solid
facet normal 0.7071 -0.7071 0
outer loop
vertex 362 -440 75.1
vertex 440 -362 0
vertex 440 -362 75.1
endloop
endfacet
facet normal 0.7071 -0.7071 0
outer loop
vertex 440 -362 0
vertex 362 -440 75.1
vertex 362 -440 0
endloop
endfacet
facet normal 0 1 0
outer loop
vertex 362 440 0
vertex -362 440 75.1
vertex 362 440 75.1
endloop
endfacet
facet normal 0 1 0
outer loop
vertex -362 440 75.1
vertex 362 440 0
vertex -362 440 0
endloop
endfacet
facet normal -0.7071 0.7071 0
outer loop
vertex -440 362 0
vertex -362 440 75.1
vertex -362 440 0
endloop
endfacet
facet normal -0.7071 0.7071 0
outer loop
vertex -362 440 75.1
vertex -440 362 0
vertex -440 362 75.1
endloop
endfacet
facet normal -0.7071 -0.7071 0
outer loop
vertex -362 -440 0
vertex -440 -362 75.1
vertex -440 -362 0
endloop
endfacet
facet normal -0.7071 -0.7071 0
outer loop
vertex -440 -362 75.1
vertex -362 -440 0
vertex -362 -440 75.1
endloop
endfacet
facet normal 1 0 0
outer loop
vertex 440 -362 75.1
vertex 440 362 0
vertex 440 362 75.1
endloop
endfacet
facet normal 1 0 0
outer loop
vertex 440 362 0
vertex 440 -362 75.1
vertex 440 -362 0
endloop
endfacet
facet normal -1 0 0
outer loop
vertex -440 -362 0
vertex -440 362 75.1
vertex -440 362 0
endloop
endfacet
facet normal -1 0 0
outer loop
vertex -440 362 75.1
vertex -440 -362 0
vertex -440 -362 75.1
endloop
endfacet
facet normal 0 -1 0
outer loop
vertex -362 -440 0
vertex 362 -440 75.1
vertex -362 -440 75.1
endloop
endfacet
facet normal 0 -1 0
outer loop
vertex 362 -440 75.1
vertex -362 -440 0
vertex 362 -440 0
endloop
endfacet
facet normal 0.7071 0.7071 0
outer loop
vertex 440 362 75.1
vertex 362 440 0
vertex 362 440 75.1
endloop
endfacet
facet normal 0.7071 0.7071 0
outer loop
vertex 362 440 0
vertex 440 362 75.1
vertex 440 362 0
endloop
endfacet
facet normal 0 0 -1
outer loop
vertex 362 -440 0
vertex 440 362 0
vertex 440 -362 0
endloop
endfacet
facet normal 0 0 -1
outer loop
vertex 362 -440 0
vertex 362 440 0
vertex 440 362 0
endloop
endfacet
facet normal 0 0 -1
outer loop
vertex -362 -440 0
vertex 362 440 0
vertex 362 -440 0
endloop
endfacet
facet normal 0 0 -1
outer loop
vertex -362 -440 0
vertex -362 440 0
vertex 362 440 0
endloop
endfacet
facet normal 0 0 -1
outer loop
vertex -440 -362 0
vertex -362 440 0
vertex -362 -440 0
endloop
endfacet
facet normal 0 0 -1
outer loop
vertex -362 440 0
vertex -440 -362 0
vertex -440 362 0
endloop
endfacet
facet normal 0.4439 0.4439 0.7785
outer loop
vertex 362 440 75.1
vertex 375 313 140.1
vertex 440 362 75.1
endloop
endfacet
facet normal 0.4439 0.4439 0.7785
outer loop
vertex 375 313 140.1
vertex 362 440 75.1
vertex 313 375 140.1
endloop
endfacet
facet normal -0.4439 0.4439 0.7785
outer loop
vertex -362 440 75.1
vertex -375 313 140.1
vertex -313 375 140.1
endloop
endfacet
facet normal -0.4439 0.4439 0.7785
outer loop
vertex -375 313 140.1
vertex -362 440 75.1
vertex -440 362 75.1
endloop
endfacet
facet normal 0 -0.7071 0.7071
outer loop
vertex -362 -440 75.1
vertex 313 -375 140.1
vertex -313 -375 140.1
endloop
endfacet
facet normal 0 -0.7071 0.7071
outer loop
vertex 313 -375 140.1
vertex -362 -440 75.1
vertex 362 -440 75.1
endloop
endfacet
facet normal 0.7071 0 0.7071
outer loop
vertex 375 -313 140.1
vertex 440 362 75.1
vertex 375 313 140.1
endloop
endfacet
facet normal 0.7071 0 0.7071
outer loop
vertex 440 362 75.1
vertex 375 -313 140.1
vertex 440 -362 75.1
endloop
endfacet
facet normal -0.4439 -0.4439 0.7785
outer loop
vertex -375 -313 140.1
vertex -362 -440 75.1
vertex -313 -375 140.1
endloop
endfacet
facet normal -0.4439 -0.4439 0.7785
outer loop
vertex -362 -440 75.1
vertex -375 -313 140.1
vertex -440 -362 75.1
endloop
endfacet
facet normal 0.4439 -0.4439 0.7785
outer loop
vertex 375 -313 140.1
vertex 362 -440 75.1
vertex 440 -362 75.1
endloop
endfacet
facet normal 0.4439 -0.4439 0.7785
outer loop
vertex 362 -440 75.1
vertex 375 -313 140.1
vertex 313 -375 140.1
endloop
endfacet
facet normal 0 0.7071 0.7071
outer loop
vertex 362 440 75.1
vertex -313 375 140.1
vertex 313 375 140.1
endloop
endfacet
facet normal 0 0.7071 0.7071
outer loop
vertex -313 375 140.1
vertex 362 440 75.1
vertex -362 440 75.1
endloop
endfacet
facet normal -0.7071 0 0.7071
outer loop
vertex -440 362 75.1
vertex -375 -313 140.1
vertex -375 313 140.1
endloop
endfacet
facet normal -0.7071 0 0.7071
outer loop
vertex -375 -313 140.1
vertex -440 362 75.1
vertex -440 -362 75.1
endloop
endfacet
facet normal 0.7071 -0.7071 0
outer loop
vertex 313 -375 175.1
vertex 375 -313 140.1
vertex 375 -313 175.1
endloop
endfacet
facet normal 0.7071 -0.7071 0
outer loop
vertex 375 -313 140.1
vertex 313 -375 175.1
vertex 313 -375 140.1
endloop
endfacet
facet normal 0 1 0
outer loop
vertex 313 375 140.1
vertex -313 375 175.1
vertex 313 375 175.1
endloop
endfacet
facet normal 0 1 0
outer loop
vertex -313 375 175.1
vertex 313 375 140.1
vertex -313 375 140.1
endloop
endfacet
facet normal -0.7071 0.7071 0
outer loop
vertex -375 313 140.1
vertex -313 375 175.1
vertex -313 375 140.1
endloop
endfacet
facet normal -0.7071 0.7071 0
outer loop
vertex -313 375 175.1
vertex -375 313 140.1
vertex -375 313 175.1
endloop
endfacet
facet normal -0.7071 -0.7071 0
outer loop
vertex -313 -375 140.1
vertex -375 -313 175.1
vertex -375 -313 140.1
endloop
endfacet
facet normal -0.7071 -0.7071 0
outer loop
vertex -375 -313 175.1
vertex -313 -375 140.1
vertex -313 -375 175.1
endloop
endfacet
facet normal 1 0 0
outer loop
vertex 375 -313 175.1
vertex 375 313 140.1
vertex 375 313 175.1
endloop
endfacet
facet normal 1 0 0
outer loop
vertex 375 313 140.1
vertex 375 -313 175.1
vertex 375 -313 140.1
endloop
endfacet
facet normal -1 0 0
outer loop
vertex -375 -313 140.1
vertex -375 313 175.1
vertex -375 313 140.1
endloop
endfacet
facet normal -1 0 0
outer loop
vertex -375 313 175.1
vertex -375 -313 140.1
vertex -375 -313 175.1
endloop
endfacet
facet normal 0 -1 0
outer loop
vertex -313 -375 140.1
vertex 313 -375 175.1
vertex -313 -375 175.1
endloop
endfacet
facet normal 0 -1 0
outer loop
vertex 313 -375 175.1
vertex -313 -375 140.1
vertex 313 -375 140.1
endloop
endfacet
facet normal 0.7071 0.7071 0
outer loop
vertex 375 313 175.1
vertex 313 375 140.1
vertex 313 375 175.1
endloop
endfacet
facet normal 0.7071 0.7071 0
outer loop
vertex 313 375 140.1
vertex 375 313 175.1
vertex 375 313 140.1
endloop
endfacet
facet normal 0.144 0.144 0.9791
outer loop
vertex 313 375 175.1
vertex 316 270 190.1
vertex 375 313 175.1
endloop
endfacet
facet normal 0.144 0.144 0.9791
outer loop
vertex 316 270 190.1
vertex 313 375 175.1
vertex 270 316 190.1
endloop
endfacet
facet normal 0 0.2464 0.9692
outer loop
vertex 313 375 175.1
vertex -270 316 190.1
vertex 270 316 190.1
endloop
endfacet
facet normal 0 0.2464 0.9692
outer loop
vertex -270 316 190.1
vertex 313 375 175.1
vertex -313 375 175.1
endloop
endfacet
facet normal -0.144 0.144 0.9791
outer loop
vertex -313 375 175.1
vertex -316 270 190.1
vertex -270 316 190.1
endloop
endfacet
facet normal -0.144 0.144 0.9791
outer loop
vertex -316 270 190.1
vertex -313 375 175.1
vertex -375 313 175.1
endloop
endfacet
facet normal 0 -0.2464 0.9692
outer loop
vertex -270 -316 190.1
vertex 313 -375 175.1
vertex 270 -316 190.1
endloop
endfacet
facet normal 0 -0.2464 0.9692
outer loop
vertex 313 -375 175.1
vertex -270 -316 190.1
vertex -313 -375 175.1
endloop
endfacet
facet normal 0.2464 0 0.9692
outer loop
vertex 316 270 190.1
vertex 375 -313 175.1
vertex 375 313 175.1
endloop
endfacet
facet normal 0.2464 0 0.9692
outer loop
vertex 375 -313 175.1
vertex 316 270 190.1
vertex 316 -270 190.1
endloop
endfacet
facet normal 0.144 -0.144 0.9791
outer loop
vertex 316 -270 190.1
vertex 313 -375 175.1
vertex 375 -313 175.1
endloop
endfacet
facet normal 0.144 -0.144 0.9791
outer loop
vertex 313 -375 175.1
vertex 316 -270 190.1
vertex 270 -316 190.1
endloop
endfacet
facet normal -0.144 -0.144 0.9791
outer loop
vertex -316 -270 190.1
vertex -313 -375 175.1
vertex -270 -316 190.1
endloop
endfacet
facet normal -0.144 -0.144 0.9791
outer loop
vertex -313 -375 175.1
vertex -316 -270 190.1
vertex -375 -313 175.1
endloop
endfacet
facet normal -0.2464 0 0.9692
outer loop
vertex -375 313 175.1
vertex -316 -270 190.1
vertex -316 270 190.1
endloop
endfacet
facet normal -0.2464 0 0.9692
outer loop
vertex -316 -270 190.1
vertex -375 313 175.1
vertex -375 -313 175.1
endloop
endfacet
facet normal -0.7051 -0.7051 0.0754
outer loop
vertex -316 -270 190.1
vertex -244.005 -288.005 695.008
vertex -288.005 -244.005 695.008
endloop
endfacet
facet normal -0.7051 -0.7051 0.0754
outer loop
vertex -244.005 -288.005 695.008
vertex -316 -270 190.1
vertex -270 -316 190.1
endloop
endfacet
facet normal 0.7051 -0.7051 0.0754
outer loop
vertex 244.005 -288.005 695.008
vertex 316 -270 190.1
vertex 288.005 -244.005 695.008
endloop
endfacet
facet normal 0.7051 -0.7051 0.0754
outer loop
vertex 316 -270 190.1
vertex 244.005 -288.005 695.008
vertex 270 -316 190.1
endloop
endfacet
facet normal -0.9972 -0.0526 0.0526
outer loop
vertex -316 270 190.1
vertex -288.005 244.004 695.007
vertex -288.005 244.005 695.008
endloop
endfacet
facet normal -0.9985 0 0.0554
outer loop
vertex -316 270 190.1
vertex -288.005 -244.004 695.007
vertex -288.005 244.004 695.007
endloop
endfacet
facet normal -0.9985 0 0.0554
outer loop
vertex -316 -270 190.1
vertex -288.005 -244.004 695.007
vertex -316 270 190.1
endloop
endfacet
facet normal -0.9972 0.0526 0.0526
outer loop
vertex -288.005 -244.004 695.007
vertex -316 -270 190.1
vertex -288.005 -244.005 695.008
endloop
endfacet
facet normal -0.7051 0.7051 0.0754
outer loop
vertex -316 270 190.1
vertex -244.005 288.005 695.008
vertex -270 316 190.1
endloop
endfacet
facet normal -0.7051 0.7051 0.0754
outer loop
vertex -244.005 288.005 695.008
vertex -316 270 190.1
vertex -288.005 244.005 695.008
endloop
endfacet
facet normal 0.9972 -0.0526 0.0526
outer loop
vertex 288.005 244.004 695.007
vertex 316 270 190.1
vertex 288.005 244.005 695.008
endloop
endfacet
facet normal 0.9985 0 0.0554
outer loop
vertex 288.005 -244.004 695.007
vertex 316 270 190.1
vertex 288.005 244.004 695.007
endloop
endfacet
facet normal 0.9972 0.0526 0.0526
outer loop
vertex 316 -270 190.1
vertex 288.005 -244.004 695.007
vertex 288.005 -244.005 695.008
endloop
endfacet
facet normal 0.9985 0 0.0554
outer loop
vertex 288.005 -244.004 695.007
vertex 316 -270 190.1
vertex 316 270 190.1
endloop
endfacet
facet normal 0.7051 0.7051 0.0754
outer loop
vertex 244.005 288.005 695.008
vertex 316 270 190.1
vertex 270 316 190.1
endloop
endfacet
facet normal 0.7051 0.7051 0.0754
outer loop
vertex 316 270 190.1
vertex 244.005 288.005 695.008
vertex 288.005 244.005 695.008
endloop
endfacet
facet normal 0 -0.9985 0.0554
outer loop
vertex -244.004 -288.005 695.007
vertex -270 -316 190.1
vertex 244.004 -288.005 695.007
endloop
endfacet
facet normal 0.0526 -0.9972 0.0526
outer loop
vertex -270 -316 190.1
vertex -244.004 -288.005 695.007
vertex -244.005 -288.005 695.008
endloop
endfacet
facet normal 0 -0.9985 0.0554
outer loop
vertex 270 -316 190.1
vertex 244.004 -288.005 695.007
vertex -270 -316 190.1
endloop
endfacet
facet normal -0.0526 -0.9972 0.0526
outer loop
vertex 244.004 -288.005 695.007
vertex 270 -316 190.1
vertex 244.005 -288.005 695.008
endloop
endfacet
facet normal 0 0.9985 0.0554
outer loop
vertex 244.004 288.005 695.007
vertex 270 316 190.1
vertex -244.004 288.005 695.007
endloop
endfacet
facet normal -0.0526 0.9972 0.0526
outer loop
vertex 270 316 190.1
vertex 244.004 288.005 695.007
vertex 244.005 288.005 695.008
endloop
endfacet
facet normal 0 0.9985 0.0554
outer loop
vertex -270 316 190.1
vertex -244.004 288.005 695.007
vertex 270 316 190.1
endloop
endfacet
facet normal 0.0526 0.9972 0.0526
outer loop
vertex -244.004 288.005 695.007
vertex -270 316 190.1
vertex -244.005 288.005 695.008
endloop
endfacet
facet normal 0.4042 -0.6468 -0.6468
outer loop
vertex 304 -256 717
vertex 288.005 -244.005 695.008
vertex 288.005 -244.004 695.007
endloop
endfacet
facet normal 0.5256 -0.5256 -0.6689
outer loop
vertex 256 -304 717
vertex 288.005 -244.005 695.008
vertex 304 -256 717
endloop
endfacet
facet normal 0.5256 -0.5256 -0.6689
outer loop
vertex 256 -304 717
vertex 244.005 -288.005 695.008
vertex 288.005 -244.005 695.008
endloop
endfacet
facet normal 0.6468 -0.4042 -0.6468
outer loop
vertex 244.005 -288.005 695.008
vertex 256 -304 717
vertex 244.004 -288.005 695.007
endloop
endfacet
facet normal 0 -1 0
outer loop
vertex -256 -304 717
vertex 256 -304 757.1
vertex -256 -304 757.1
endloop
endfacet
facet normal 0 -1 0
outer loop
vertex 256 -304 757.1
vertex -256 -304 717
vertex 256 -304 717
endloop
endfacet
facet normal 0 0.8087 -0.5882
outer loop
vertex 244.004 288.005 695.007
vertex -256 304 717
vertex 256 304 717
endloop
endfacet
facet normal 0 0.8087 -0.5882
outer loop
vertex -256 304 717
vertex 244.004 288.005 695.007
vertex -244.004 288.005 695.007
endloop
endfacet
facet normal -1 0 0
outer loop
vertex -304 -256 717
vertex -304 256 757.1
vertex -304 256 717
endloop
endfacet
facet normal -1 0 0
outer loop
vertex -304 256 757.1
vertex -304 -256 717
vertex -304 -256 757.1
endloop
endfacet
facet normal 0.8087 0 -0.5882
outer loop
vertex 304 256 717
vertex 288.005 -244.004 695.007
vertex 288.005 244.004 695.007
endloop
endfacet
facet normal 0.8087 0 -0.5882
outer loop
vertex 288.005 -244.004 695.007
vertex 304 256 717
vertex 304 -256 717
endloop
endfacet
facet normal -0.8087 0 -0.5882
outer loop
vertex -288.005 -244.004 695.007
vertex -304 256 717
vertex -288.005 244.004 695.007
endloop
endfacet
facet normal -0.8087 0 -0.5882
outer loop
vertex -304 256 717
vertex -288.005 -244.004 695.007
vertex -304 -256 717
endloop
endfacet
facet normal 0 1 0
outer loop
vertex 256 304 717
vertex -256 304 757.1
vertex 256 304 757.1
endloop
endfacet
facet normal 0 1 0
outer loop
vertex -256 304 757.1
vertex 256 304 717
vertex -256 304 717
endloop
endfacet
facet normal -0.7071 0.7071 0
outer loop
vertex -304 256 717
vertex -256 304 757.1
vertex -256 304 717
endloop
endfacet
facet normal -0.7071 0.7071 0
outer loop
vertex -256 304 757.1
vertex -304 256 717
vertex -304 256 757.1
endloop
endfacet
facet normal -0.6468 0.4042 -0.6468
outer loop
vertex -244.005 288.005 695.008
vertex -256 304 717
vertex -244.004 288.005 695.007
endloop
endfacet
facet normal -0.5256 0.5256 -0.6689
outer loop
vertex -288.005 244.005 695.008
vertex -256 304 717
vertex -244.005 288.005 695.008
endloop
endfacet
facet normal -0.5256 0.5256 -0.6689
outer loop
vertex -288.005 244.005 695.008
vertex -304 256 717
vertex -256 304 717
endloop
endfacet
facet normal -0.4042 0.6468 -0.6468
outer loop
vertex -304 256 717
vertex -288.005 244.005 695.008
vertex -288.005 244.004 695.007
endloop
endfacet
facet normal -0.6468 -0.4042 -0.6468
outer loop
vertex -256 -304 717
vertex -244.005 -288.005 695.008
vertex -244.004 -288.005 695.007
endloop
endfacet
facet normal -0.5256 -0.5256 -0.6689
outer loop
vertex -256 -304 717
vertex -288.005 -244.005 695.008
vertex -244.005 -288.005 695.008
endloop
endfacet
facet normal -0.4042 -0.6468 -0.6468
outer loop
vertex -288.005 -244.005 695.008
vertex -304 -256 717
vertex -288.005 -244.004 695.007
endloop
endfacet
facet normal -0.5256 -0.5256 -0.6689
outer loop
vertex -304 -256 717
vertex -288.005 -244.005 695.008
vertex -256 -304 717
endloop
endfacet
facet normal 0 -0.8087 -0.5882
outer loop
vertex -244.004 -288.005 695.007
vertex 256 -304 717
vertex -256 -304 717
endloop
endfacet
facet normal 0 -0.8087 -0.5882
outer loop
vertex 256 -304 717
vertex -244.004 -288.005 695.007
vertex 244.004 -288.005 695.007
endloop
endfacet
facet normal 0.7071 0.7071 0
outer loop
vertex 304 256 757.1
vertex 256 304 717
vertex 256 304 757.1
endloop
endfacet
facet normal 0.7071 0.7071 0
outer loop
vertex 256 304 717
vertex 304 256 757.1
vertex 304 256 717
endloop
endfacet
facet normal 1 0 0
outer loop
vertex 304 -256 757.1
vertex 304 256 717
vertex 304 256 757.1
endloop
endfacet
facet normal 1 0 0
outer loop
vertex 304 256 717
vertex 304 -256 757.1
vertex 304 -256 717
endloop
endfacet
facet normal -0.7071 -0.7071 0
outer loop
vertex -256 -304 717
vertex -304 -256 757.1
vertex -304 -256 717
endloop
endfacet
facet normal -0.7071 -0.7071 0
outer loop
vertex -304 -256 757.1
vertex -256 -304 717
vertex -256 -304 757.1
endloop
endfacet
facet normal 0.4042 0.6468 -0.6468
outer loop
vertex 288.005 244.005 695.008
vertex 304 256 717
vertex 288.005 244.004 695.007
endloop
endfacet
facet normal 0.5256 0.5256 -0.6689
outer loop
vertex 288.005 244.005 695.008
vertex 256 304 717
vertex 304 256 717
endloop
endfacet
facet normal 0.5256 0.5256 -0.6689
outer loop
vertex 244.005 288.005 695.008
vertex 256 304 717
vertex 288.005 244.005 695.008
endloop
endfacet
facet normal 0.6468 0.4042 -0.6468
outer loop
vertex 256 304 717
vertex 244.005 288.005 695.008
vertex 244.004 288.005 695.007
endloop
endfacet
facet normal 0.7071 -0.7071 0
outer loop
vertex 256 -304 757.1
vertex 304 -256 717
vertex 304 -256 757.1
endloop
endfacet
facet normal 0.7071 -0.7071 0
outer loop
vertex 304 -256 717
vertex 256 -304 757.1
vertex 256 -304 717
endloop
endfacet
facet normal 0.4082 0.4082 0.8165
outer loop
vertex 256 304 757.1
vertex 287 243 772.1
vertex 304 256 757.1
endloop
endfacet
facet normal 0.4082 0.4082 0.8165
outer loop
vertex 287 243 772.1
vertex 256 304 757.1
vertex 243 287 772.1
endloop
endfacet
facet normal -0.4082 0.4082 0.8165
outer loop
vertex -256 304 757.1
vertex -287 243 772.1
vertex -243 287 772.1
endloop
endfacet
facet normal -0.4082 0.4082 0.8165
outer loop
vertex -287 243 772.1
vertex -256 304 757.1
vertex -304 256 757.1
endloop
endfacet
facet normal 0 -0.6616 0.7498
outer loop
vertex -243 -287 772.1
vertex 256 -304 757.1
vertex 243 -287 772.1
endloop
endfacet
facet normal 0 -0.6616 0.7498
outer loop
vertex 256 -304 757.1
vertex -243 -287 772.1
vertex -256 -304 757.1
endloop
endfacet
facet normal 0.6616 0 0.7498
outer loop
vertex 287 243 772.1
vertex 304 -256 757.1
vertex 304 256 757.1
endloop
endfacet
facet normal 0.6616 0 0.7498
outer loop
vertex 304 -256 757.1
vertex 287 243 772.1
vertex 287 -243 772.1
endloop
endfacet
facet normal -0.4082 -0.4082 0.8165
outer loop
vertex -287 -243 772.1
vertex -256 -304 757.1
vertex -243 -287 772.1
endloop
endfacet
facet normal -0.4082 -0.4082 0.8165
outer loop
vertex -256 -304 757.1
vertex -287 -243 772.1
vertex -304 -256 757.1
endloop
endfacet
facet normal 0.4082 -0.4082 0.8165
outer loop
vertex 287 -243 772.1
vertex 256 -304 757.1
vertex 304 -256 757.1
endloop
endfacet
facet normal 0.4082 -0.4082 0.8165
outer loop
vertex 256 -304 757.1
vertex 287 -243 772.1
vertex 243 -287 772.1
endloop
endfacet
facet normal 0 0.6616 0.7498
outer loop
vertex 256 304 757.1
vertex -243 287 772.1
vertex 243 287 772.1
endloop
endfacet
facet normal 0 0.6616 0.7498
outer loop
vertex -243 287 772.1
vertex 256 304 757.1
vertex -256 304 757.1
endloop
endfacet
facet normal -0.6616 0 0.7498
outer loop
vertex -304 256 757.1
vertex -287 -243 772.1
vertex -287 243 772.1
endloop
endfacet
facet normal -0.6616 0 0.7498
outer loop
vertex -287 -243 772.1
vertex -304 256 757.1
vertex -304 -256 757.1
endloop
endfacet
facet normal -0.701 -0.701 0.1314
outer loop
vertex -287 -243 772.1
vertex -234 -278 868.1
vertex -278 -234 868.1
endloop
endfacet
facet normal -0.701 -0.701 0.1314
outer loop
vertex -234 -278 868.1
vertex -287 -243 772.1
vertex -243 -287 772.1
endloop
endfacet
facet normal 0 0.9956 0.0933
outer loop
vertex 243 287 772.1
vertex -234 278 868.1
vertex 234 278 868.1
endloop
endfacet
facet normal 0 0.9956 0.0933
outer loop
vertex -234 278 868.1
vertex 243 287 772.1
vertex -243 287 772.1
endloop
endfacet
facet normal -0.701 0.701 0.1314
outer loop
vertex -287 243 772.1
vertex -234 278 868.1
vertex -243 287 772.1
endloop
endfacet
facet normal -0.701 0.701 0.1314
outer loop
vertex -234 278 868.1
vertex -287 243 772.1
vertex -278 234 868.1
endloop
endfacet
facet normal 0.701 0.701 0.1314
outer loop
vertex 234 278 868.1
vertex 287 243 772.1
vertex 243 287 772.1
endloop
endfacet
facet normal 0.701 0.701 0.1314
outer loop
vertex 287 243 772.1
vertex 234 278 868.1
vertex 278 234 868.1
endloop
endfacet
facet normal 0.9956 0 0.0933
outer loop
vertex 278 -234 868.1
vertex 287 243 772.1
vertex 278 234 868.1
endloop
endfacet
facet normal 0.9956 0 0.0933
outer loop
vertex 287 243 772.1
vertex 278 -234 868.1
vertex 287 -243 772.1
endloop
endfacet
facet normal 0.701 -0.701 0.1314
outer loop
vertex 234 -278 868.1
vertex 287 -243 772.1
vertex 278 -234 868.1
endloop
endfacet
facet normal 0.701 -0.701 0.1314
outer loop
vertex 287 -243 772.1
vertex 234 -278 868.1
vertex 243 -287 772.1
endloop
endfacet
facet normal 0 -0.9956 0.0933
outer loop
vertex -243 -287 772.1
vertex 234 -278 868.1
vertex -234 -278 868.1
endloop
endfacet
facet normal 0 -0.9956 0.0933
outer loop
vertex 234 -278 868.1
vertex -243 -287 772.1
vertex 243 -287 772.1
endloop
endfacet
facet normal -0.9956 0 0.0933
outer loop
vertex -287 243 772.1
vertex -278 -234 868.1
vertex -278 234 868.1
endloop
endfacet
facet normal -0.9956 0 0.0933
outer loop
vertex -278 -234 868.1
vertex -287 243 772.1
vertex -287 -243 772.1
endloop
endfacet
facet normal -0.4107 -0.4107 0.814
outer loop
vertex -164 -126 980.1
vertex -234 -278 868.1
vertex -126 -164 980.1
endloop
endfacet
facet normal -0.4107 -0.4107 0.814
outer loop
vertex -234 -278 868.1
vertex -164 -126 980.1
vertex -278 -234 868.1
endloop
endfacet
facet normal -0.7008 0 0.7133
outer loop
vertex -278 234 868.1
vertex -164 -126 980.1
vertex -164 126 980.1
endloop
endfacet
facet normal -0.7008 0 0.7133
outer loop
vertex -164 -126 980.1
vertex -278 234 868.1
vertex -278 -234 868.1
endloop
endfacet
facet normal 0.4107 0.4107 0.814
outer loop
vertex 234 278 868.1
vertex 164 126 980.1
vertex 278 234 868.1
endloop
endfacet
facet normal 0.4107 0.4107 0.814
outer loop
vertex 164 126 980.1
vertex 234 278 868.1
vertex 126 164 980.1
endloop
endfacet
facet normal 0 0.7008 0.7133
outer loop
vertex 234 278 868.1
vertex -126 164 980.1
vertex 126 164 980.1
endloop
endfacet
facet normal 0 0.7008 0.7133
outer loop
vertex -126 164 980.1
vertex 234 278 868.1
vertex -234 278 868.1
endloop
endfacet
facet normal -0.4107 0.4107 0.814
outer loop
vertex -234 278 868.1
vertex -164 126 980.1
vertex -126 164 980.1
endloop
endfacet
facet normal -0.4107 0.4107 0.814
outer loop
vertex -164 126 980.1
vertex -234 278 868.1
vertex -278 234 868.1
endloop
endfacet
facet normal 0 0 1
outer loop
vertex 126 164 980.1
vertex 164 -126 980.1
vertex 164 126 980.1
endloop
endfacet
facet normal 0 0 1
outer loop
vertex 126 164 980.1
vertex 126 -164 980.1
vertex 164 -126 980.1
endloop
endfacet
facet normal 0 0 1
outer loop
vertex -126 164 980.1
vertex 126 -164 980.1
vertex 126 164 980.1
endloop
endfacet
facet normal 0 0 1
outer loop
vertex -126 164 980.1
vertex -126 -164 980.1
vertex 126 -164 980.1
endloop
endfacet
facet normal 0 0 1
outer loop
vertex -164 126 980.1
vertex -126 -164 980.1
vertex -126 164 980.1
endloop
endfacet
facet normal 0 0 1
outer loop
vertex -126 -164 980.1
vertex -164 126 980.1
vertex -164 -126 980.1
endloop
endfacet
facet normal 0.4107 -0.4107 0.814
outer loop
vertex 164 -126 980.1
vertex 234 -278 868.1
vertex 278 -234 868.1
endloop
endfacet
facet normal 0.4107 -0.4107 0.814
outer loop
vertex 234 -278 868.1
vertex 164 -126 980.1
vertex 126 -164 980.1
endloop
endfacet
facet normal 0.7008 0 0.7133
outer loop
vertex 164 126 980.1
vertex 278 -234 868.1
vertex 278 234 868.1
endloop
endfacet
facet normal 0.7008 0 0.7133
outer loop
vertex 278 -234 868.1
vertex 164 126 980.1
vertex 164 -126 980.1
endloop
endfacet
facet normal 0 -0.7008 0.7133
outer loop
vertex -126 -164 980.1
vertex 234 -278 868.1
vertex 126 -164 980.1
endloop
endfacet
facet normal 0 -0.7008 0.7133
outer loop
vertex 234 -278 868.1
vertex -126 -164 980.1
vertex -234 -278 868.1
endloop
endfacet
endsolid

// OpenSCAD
// 毫米，底面中心为原点。削去碑角使正面纹章在小尺寸下仍然清晰。
module section(z, half, bevel) {
    translate([0, 0, z]) linear_extrude(0.1)
        polygon([[-half+bevel,-half],[half-bevel,-half],[half,-half+bevel],
                 [half,half-bevel],[half-bevel,half],[-half+bevel,half],
                 [-half,half-bevel],[-half,-half+bevel]]);
}

levels = [[0,440,78],[75,440,78],[140,375,62],[175,375,62],
          [190,316,46],[695,288,44],[717,304,48],[757,304,48],
          [772,287,44],[868,278,44],[980,164,38]];
for (i = [0:len(levels)-2]) hull() {
    section(levels[i][0], levels[i][1], levels[i][2]);
    section(levels[i+1][0], levels[i+1][1], levels[i+1][2]);
}
